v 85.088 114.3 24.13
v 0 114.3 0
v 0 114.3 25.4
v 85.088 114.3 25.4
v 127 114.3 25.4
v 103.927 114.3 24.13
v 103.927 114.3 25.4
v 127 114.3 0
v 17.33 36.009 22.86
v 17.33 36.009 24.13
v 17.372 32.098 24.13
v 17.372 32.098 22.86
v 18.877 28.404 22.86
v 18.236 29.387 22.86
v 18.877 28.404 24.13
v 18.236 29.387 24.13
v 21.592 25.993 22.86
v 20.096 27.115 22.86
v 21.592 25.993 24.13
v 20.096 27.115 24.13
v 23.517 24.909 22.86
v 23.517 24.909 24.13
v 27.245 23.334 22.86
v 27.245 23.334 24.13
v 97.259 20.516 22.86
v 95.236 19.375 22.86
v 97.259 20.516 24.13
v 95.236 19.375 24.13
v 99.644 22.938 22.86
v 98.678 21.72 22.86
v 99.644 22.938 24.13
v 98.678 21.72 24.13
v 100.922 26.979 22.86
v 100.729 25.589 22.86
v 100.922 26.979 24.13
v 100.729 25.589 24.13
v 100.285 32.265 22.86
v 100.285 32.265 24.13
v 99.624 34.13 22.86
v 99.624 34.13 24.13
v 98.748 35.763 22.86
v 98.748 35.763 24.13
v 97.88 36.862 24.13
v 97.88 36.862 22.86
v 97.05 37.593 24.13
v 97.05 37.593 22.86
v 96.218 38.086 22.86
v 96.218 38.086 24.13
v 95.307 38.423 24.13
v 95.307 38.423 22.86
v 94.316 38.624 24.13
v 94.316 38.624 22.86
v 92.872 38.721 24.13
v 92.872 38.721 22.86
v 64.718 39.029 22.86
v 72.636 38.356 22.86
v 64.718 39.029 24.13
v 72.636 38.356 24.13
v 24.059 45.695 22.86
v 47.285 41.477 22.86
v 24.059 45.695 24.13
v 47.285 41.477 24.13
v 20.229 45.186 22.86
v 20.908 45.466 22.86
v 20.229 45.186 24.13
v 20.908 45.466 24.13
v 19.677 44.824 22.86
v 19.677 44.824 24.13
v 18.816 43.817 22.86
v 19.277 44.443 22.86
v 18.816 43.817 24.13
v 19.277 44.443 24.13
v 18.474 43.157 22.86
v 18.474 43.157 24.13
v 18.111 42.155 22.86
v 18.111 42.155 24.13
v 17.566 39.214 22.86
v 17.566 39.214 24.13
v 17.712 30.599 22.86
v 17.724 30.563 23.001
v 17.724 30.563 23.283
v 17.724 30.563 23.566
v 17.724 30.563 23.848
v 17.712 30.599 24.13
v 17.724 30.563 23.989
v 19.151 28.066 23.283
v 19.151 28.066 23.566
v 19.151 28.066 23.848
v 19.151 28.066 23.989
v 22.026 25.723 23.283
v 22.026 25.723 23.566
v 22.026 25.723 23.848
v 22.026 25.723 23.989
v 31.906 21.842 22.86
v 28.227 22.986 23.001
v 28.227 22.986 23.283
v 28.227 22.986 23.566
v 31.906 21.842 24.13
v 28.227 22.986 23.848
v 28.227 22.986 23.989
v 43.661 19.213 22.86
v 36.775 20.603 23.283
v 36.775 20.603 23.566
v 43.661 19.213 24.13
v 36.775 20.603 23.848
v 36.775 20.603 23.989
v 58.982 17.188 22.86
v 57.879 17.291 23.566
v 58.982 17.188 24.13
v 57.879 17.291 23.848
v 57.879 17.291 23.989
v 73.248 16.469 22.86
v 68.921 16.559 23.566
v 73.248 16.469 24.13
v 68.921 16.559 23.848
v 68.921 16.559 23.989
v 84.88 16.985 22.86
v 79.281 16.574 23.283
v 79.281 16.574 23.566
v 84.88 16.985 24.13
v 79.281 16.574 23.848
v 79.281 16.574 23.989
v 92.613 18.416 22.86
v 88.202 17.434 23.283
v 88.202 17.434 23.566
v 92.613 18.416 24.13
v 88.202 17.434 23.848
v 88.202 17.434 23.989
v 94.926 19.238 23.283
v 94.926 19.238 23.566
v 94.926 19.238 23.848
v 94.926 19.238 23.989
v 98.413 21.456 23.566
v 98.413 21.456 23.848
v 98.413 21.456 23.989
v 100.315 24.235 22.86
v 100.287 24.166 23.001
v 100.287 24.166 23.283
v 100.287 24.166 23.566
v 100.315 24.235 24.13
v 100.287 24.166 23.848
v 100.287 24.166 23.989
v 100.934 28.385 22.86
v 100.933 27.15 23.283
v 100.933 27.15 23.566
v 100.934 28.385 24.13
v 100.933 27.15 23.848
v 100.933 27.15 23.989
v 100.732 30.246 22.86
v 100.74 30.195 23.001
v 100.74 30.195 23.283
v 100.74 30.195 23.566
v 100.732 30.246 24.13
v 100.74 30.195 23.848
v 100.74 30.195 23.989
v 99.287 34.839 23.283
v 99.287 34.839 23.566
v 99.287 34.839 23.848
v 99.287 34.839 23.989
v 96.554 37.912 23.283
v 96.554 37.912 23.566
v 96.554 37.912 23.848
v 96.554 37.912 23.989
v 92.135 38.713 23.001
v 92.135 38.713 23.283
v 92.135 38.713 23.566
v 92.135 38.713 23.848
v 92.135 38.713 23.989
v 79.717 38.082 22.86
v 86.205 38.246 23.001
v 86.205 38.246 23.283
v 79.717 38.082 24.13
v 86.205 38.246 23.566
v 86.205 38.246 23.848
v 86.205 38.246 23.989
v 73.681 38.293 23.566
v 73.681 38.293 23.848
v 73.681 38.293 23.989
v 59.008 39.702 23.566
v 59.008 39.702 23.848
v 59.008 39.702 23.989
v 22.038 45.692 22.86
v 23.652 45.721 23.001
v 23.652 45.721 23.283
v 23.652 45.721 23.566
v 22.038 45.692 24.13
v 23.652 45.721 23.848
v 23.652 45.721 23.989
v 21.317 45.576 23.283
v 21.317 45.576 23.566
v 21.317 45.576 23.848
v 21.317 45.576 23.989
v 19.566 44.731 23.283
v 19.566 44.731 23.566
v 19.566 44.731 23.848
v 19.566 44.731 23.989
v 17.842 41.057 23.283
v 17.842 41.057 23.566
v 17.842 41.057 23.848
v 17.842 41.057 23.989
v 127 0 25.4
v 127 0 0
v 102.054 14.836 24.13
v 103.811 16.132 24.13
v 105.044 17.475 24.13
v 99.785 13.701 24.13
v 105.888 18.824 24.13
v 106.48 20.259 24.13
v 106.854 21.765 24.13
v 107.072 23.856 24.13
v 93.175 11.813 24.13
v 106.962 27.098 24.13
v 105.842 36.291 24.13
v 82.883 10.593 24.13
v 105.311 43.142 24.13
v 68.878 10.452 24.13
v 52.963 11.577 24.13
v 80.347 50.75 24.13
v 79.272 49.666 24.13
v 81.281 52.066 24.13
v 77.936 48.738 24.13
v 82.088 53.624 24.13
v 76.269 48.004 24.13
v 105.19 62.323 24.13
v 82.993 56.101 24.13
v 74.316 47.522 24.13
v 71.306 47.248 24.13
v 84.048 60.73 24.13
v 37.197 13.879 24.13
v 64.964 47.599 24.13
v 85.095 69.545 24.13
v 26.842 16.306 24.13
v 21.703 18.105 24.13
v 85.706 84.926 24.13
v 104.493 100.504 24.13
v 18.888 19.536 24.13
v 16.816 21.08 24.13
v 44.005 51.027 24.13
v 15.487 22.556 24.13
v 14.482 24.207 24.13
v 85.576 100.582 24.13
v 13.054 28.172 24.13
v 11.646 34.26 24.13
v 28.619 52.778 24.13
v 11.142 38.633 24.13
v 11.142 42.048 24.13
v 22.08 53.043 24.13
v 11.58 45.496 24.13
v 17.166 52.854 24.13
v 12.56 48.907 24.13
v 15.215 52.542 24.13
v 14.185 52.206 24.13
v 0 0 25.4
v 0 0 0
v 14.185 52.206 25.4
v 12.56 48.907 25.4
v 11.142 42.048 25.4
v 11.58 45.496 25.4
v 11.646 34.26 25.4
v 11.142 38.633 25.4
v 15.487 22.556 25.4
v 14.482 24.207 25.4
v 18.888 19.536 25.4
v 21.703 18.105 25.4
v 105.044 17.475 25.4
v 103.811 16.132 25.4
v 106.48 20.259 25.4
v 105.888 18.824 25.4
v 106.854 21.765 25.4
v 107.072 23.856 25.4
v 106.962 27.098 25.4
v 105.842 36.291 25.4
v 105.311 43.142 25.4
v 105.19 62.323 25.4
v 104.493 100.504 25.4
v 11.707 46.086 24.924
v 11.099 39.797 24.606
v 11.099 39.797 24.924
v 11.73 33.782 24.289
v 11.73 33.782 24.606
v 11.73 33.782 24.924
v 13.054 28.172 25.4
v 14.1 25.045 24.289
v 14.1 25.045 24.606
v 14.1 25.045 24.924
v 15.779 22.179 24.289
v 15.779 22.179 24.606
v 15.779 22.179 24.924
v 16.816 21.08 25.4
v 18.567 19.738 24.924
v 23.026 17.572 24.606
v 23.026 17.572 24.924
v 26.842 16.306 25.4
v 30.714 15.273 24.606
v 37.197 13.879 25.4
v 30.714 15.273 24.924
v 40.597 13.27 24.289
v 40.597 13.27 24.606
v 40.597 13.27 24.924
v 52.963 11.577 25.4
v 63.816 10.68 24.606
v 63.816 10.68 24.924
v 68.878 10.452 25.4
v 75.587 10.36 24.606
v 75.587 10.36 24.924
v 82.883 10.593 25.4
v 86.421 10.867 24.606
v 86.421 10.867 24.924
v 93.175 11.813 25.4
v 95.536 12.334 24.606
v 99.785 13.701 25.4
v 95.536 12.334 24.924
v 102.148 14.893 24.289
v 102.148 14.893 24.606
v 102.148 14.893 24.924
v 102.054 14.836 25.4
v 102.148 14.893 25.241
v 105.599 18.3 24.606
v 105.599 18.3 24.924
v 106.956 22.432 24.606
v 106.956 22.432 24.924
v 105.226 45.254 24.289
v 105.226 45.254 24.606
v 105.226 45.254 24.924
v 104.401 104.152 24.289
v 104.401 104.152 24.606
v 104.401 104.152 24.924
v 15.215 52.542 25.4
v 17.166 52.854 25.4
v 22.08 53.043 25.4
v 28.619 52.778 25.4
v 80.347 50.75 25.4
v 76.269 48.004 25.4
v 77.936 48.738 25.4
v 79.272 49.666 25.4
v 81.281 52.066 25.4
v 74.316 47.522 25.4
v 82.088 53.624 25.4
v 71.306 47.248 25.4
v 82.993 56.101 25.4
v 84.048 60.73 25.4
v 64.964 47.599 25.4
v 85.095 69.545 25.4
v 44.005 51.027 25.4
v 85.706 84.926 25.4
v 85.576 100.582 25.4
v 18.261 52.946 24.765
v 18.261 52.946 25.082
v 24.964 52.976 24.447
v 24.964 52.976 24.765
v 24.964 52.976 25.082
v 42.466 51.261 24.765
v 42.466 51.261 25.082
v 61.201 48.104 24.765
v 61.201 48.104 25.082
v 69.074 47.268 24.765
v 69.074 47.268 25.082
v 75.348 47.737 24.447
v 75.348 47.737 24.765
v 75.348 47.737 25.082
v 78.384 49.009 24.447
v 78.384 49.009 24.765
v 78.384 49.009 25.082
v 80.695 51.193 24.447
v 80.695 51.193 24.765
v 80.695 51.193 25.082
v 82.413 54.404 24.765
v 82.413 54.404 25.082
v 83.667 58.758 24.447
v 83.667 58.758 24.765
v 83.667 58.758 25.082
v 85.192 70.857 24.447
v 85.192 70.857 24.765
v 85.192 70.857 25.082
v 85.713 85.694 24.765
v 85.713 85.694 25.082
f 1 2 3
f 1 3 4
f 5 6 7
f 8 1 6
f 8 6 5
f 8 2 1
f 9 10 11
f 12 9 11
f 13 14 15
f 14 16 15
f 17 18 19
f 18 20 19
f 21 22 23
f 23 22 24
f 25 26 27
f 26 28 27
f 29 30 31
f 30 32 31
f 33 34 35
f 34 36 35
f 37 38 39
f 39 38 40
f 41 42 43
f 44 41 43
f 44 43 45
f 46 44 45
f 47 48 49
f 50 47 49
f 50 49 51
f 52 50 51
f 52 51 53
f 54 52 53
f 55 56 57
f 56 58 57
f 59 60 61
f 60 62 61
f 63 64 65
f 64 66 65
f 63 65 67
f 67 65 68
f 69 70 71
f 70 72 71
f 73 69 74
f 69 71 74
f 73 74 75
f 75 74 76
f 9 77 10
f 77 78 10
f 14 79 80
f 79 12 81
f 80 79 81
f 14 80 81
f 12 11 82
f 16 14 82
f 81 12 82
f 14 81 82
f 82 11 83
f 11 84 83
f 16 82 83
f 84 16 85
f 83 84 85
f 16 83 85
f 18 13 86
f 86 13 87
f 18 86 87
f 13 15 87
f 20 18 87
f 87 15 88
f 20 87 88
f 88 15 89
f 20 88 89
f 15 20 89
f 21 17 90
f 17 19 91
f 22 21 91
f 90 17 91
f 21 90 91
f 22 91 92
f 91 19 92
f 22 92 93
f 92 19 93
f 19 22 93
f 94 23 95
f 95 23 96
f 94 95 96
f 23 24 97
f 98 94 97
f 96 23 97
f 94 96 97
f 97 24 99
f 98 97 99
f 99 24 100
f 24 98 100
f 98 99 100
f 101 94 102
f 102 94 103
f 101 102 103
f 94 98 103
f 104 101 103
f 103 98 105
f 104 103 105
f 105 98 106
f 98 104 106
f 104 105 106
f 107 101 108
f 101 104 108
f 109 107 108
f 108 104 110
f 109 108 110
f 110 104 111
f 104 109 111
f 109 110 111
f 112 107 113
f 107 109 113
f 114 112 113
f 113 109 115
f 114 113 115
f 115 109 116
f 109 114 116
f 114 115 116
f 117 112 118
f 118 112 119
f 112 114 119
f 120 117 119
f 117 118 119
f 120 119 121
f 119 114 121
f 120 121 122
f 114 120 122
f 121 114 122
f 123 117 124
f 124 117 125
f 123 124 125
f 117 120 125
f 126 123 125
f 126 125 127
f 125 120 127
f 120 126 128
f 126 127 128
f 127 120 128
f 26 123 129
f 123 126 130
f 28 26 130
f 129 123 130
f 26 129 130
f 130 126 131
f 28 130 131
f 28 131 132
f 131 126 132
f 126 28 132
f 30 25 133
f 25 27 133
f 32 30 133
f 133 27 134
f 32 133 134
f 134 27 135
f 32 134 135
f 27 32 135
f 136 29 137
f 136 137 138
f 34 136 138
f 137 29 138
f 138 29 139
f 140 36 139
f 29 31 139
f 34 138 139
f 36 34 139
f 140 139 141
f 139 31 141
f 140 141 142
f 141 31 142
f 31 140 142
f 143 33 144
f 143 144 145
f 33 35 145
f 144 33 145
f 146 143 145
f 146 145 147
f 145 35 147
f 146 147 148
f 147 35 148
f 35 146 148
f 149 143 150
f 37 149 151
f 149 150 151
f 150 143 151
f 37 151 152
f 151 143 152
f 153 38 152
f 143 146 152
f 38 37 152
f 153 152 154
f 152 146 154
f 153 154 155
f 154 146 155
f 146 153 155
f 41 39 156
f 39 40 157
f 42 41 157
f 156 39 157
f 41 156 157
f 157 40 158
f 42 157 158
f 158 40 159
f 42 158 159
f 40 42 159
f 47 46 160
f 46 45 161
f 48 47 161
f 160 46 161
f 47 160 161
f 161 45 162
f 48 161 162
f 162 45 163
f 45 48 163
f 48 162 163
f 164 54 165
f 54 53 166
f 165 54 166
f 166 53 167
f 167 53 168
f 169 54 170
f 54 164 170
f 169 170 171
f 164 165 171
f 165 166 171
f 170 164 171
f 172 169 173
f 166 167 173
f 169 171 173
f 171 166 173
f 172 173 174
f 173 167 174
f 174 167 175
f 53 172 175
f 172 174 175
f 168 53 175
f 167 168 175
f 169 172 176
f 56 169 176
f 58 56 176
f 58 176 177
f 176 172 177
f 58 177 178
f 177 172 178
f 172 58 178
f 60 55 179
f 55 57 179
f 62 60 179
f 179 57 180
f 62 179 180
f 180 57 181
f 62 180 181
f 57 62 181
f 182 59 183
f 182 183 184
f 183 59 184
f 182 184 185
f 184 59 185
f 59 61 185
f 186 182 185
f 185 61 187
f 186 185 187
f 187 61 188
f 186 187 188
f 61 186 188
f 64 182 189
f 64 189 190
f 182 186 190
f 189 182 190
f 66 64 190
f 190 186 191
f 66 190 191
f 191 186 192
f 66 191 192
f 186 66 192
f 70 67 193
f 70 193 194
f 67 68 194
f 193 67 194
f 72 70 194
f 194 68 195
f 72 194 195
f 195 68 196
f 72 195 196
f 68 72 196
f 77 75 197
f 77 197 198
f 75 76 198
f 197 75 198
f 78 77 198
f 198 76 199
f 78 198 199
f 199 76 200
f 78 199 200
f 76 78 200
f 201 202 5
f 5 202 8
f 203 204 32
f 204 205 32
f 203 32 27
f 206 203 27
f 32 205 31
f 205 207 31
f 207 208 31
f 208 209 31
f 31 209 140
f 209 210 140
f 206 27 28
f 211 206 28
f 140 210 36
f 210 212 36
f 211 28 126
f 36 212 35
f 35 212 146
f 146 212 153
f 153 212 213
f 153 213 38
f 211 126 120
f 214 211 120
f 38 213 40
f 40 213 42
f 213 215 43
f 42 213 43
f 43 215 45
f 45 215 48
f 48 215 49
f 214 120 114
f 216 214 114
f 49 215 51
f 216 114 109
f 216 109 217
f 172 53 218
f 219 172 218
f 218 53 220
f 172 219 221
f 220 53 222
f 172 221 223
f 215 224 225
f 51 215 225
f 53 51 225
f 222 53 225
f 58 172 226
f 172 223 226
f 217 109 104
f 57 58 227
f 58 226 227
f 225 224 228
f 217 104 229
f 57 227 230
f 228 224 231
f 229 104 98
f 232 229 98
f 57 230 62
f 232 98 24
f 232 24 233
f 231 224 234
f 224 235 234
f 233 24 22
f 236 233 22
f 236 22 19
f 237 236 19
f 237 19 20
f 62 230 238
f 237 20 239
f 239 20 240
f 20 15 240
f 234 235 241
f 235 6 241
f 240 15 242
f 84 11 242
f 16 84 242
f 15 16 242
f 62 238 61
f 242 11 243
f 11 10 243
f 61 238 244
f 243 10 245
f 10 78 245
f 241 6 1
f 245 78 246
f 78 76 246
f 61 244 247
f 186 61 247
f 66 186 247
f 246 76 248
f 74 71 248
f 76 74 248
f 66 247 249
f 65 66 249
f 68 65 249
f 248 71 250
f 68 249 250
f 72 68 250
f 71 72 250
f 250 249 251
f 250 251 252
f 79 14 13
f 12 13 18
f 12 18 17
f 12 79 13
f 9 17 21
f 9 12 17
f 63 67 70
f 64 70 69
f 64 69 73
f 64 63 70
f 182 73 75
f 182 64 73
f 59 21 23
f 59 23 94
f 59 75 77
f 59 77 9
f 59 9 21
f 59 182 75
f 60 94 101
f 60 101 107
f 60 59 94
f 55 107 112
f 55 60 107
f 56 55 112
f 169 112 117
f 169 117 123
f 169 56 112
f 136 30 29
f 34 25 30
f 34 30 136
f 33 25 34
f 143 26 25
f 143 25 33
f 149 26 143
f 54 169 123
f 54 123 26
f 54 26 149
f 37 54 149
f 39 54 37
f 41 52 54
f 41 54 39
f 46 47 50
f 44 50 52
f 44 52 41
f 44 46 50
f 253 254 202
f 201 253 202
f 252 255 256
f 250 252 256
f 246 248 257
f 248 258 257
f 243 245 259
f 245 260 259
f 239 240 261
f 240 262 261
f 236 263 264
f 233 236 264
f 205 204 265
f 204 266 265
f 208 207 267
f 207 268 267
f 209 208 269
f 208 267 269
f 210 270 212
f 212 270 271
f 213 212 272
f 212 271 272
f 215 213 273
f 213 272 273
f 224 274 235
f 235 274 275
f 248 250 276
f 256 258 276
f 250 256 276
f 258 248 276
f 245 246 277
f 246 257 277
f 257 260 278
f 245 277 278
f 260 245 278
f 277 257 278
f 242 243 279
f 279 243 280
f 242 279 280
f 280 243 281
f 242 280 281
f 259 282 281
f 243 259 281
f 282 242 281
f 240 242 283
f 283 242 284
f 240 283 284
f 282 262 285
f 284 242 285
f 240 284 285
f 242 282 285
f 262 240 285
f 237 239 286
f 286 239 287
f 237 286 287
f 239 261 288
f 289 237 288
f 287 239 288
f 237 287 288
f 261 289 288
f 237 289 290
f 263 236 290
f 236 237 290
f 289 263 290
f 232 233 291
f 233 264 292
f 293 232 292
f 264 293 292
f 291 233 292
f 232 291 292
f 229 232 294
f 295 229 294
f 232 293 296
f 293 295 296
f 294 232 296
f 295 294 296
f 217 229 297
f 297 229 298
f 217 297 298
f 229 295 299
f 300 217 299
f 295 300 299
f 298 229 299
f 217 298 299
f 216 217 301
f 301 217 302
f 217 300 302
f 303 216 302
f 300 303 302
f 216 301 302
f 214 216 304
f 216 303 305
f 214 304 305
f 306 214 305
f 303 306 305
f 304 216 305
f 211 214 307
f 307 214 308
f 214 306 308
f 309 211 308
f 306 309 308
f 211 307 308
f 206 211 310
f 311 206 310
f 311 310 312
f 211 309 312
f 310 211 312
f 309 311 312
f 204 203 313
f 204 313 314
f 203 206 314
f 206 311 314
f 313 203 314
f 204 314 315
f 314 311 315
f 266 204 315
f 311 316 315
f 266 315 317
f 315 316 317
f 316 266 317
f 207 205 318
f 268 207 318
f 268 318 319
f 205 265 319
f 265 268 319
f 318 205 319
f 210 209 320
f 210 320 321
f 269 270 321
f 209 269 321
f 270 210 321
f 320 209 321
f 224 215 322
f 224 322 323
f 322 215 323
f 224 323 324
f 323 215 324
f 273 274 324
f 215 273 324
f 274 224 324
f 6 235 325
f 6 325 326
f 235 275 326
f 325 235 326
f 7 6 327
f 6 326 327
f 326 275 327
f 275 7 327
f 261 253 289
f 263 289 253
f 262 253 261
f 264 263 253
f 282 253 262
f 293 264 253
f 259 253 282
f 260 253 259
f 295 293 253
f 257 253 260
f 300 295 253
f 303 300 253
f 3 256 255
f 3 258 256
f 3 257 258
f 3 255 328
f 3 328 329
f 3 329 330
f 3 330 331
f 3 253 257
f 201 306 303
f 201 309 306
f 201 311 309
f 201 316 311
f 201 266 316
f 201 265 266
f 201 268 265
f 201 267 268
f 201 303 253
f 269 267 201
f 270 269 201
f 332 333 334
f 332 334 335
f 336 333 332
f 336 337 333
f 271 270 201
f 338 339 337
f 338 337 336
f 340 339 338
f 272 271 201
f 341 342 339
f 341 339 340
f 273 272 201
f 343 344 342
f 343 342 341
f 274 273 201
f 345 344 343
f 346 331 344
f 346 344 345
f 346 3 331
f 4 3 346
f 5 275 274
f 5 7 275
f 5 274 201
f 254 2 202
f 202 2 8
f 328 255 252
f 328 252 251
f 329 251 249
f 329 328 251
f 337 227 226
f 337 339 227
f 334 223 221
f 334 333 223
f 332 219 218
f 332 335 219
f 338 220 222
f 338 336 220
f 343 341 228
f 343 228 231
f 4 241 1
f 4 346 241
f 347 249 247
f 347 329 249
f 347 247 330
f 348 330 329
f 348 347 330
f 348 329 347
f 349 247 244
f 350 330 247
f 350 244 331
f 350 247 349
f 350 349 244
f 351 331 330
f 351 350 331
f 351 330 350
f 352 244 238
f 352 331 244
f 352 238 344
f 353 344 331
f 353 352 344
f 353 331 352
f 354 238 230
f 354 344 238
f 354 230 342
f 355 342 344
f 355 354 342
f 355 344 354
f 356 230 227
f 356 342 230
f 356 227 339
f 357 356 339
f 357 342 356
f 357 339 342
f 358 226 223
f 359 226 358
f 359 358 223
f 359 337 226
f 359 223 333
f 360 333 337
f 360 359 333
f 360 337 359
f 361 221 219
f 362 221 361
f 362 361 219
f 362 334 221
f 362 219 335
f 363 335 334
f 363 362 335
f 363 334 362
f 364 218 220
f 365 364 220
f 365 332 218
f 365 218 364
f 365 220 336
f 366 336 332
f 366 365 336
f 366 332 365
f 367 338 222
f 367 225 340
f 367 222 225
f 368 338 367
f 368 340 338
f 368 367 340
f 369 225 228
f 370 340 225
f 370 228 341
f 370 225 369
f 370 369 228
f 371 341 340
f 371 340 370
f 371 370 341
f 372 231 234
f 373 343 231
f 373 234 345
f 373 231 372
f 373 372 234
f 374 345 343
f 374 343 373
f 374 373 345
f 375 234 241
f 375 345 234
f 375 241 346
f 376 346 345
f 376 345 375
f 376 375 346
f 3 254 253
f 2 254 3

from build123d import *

# Parameters (mm, degrees)
F0_W     = 127
F0_H     = 114.3
F1_DEPTH = 25.4
F3_DEPTH = 1.27
F5_DEPTH = 1.27


with BuildPart() as f1:
    # F0 (on Top) → F1 (new body)
    with BuildSketch(Plane.XY):
        with Locations((63.5, 57.15)):
            Rectangle(F0_W, F0_H)
    extrude(amount=F1_DEPTH)

    # F2 (on face) → F3 (cut)
    with BuildSketch(Plane.XY.offset(25.4)):
        with BuildLine():
            add(Edge.make_bspline(
                [(14.1847563811, 52.2055240917), (17.4487959109, 53.7079227085), (44.0648456389, 52.3834737993), (76.3646543067, 43.8224977855), (86.876160603, 58.6900123256), (85.7991725206, 98.7972319126), (85.0884243846, 114.3)],
                knots=[0, 0, 0, 0, 0.2391860512, 0.4977603129, 0.6648459321, 1, 1, 1, 1], degree=3))
            add(Edge.make_bspline(
                [(14.1847563811, 52.2055240917), (9.3520639285, 44.3586118248), (12.6536367905, 27.3638536613), (18.8402383609, 13.1893525319), (111.1929834742, 4.3184234807), (106.0842219021, 31.5919931867), (105.011416035, 45.8787461527), (105.453560332, 56.0596204571), (104.4717881583, 103.8925926493), (104.1626564269, 112.1080434235), (103.9274847168, 114.3)],
                knots=[0, 0, 0, 0, 0.125167649, 0.2241295981, 0.4526613861, 0.5590531122, 0.654439907, 0.7410544741, 0.9181350115, 1, 1, 1, 1], degree=3))
            Line((103.9274847168, 114.3), (85.0884243846, 114.3))
        make_face()
    extrude(amount=-F3_DEPTH, mode=Mode.SUBTRACT)

    # F4 (on face) → F5 (cut)
    with BuildSketch(Plane.XY.offset(24.13)):
        with BuildLine():
            add(Edge.make_bspline(
                [(17.3297971487, 36.0093638301), (17.1264335807, 32.1824747761), (16.7468664577, 19.990502465), (99.4656784545, 11.0394241251), (101.8550549051, 29.9085688187), (97.288582885, 39.9784776436), (85.0653254375, 37.3506070875), (58.7990104766, 39.0558539778), (31.3772513508, 44.4144756293), (18.0443954585, 47.1135718459), (17.5112593814, 39.4241142635), (17.3297971487, 36.0093638301)],
                knots=[0, 0, 0, 0, 0.0873823539, 0.3096906394, 0.4012120879, 0.4782072039, 0.5618270224, 0.6974413037, 0.838945922, 0.9220283299, 1, 1, 1, 1], degree=3))
        make_face()
    extrude(amount=-F5_DEPTH, mode=Mode.SUBTRACT)


solid = f1.part
